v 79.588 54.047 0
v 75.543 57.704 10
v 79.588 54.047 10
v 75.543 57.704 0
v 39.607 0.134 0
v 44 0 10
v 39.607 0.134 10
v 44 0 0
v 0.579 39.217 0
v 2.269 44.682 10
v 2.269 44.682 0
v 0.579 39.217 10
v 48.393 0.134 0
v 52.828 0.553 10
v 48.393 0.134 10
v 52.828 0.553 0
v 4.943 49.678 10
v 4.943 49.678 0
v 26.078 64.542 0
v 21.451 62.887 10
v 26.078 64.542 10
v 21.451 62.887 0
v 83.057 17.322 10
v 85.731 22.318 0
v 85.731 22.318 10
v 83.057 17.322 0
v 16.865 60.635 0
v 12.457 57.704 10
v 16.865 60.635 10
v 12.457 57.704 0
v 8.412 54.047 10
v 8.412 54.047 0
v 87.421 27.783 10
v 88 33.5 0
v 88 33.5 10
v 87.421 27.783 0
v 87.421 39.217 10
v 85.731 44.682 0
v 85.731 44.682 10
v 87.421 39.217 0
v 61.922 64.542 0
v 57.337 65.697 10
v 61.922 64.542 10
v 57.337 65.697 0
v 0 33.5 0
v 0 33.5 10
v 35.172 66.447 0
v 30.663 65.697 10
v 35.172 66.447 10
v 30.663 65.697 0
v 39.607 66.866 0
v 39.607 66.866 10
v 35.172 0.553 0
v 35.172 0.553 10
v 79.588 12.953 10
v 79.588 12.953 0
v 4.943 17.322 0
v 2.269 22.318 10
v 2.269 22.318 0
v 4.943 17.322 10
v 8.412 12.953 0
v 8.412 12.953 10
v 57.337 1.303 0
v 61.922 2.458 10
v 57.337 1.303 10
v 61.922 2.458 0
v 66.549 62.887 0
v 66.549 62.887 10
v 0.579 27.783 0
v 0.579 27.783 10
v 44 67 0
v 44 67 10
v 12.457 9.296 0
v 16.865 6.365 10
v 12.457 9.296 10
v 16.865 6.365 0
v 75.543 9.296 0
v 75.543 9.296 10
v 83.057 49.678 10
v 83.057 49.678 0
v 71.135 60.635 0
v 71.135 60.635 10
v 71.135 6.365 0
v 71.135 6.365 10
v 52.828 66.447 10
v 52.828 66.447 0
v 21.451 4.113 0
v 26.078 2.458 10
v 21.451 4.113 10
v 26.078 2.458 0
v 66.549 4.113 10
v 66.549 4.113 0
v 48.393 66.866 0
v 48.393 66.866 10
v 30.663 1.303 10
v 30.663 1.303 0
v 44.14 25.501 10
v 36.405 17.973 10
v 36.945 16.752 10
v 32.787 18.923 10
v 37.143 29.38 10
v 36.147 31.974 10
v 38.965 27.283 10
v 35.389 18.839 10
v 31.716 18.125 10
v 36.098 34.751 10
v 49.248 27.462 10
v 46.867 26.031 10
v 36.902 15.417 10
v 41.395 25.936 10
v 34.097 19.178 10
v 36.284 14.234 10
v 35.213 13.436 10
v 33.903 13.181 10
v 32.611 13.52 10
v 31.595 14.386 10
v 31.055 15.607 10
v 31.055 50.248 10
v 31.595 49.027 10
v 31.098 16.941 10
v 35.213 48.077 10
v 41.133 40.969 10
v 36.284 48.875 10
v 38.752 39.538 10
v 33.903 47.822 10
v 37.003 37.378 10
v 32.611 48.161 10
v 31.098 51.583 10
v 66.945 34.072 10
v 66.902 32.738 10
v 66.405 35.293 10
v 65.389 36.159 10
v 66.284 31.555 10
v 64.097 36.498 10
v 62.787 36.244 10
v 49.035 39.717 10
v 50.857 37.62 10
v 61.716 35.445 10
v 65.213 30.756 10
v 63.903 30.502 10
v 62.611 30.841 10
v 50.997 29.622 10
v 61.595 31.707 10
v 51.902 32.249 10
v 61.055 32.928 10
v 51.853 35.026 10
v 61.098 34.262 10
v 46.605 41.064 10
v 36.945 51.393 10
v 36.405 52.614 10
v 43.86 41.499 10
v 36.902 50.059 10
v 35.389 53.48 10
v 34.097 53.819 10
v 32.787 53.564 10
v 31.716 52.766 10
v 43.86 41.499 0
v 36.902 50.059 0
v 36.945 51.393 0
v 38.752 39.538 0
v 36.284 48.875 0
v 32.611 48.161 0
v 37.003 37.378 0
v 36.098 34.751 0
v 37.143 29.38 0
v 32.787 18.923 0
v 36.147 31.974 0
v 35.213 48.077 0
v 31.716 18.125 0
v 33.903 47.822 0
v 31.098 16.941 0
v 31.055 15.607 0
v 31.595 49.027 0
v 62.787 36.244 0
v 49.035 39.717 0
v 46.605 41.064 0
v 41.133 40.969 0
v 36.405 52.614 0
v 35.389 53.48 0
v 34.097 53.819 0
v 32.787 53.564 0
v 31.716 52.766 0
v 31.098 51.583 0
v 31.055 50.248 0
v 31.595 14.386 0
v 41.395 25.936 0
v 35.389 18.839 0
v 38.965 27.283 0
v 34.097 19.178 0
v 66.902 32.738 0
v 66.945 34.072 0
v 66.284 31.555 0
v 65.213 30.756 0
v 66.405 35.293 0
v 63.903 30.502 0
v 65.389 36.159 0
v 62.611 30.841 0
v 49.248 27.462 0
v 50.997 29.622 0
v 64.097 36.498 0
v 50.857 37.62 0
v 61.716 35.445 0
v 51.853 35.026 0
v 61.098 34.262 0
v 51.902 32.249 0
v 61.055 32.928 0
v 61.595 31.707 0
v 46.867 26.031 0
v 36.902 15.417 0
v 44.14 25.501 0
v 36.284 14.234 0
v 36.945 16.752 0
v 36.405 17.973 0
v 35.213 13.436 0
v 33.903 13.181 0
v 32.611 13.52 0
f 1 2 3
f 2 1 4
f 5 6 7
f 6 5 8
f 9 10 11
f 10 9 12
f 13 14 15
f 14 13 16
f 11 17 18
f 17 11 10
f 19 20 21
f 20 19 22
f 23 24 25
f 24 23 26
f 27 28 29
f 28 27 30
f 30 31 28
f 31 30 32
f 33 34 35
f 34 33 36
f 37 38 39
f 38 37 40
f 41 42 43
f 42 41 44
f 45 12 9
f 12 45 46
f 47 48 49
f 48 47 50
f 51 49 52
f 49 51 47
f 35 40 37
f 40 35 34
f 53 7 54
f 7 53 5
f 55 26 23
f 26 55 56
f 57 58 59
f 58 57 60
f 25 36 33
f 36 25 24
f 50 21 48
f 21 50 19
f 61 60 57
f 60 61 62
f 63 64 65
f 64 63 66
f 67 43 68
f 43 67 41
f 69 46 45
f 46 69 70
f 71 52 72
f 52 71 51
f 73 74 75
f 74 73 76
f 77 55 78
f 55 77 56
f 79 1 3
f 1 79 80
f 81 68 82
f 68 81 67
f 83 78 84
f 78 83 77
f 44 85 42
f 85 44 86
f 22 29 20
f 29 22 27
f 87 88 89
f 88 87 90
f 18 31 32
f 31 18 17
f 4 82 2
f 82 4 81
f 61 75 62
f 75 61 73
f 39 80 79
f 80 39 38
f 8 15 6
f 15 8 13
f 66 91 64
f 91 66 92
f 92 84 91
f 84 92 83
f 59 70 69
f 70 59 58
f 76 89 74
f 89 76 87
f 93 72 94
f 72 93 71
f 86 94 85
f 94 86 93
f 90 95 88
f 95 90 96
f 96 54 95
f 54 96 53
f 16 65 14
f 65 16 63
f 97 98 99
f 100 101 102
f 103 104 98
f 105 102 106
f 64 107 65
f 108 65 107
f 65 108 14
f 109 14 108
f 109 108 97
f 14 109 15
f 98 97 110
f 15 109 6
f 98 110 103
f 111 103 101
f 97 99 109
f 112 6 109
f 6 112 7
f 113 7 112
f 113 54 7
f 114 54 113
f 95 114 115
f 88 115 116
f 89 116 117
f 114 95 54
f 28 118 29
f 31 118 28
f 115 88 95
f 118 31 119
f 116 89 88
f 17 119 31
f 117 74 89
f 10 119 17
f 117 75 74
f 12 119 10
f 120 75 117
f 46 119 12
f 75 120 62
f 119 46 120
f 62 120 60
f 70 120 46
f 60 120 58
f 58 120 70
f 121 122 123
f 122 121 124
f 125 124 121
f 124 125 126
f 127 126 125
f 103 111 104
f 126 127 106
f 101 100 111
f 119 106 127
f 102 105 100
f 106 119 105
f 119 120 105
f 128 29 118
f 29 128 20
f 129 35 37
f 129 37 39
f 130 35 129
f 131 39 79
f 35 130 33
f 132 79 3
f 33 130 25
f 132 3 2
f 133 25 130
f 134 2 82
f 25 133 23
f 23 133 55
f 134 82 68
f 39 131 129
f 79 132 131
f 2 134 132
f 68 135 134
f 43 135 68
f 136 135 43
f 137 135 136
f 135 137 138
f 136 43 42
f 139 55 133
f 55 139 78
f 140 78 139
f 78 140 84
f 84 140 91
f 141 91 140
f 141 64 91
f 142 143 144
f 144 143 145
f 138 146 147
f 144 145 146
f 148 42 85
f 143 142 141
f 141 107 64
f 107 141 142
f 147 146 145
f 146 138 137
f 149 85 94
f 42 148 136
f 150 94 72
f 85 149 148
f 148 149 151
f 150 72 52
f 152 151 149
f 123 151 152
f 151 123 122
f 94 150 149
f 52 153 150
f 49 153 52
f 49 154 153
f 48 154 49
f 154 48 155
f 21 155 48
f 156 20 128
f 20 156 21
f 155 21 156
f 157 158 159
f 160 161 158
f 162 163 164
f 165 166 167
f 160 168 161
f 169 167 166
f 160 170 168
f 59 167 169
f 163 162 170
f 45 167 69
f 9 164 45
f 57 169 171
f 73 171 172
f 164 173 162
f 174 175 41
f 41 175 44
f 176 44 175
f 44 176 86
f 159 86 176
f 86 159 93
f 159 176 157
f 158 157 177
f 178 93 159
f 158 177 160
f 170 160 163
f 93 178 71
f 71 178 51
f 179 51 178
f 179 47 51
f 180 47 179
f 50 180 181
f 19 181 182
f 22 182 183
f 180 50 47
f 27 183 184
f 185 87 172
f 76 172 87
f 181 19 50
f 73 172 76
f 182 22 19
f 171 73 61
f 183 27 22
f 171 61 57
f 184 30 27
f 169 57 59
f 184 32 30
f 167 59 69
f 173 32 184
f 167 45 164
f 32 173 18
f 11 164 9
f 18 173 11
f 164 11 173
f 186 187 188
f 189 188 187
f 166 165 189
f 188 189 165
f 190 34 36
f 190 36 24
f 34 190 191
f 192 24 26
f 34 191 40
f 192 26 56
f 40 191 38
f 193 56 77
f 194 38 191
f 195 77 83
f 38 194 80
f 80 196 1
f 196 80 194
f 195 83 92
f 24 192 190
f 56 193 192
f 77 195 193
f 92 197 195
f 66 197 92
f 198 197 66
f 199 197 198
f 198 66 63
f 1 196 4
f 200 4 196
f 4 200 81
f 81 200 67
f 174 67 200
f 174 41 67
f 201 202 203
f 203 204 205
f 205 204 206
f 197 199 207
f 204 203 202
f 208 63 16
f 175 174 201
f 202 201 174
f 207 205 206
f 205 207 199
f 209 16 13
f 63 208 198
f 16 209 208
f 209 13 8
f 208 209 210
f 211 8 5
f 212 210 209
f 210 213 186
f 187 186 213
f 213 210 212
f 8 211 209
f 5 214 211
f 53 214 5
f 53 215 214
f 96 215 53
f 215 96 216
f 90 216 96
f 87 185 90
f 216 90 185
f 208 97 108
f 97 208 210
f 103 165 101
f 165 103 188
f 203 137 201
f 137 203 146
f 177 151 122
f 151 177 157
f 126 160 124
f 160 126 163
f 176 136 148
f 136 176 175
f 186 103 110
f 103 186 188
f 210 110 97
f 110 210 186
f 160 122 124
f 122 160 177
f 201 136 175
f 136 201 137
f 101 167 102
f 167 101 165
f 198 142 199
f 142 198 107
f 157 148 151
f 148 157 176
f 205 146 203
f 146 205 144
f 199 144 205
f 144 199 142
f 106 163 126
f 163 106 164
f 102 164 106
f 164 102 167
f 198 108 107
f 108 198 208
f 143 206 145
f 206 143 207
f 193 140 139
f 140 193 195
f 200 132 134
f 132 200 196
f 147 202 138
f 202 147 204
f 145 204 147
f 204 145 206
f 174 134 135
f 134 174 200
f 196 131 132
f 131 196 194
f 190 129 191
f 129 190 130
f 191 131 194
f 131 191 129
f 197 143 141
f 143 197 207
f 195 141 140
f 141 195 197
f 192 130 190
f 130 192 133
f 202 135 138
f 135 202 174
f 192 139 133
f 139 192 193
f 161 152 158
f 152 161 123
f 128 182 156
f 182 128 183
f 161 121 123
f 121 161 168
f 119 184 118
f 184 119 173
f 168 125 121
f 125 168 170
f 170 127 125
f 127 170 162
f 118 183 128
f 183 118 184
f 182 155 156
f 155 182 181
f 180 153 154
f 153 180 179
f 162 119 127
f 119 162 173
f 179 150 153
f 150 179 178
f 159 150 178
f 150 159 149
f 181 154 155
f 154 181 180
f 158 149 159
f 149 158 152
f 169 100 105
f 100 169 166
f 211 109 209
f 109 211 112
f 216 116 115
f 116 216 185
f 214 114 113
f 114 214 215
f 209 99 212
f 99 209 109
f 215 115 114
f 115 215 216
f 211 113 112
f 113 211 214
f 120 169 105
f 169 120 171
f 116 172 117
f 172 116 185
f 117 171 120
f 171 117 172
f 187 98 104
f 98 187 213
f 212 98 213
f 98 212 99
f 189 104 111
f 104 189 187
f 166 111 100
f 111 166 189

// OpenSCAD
$fn = 32;

// ----------------------------------------------------------------------
// Cam plate: double_lobe cam, base R32
// ----------------------------------------------------------------------

// --- parameters (mm) ---
base_r = 32;              // base circle radius
lobe_h = 12;              // cam lobe rise
bore_r = 8;               // shaft bore radius
plate_t = 10;             // plate thickness, Z (extrusion height)
ring_r = 20;              // lightening ring radius
bolt_r = 3;               // lightening hole radius

profile = [[88, 33.5], [87.421, 39.217], [85.731, 44.682], [83.057, 49.678], [79.588, 54.047], [75.543, 57.704], [71.135, 60.635], [66.549, 62.887], [61.922, 64.542], [57.337, 65.697], [52.828, 66.447], [48.393, 66.866], [44, 67], [39.607, 66.866], [35.172, 66.447], [30.663, 65.697], [26.078, 64.542], [21.451, 62.887], [16.865, 60.635], [12.457, 57.704], [8.412, 54.047], [4.943, 49.678], [2.269, 44.682], [0.579, 39.217], [0, 33.5], [0.579, 27.783], [2.269, 22.318], [4.943, 17.322], [8.412, 12.953], [12.457, 9.296], [16.865, 6.365], [21.451, 4.113], [26.078, 2.458], [30.663, 1.303], [35.172, 0.553], [39.607, 0.134], [44, 0], [48.393, 0.134], [52.828, 0.553], [57.337, 1.303], [61.922, 2.458], [66.549, 4.113], [71.135, 6.365], [75.543, 9.296], [79.588, 12.953], [83.057, 17.322], [85.731, 22.318], [87.421, 27.783]];  // primary outline, 48 points, counter clockwise
void_1 = [[51.853, 35.026], [50.857, 37.62], [49.035, 39.717], [46.605, 41.064], [43.86, 41.499], [41.133, 40.969], [38.752, 39.538], [37.003, 37.378], [36.098, 34.751], [36.147, 31.974], [37.143, 29.38], [38.965, 27.283], [41.395, 25.936], [44.14, 25.501], [46.867, 26.031], [49.248, 27.462], [50.997, 29.622], [51.902, 32.249]];  // shaft bore, 18 points
void_2 = [[66.945, 34.072], [66.405, 35.293], [65.389, 36.159], [64.097, 36.498], [62.787, 36.244], [61.716, 35.445], [61.098, 34.262], [61.055, 32.928], [61.595, 31.707], [62.611, 30.841], [63.903, 30.502], [65.213, 30.756], [66.284, 31.555], [66.902, 32.738]];  // lightening hole 1, 14 points
void_3 = [[36.945, 51.393], [36.405, 52.614], [35.389, 53.48], [34.097, 53.819], [32.787, 53.564], [31.716, 52.766], [31.098, 51.583], [31.055, 50.248], [31.595, 49.027], [32.611, 48.161], [33.903, 47.822], [35.213, 48.077], [36.284, 48.875], [36.902, 50.059]];  // lightening hole 2, 14 points
void_4 = [[36.945, 16.752], [36.405, 17.973], [35.389, 18.839], [34.097, 19.178], [32.787, 18.923], [31.716, 18.125], [31.098, 16.941], [31.055, 15.607], [31.595, 14.386], [32.611, 13.52], [33.903, 13.181], [35.213, 13.436], [36.284, 14.234], [36.902, 15.417]];  // lightening hole 3, 14 points

// --- the one profile operation ---
difference() {
  linear_extrude(height = plate_t) polygon(points = profile);
  translate([0, 0, -1])
    linear_extrude(height = plate_t + 2) polygon(points = void_1);
  translate([0, 0, -1])
    linear_extrude(height = plate_t + 2) polygon(points = void_2);
  translate([0, 0, -1])
    linear_extrude(height = plate_t + 2) polygon(points = void_3);
  translate([0, 0, -1])
    linear_extrude(height = plate_t + 2) polygon(points = void_4);
}
